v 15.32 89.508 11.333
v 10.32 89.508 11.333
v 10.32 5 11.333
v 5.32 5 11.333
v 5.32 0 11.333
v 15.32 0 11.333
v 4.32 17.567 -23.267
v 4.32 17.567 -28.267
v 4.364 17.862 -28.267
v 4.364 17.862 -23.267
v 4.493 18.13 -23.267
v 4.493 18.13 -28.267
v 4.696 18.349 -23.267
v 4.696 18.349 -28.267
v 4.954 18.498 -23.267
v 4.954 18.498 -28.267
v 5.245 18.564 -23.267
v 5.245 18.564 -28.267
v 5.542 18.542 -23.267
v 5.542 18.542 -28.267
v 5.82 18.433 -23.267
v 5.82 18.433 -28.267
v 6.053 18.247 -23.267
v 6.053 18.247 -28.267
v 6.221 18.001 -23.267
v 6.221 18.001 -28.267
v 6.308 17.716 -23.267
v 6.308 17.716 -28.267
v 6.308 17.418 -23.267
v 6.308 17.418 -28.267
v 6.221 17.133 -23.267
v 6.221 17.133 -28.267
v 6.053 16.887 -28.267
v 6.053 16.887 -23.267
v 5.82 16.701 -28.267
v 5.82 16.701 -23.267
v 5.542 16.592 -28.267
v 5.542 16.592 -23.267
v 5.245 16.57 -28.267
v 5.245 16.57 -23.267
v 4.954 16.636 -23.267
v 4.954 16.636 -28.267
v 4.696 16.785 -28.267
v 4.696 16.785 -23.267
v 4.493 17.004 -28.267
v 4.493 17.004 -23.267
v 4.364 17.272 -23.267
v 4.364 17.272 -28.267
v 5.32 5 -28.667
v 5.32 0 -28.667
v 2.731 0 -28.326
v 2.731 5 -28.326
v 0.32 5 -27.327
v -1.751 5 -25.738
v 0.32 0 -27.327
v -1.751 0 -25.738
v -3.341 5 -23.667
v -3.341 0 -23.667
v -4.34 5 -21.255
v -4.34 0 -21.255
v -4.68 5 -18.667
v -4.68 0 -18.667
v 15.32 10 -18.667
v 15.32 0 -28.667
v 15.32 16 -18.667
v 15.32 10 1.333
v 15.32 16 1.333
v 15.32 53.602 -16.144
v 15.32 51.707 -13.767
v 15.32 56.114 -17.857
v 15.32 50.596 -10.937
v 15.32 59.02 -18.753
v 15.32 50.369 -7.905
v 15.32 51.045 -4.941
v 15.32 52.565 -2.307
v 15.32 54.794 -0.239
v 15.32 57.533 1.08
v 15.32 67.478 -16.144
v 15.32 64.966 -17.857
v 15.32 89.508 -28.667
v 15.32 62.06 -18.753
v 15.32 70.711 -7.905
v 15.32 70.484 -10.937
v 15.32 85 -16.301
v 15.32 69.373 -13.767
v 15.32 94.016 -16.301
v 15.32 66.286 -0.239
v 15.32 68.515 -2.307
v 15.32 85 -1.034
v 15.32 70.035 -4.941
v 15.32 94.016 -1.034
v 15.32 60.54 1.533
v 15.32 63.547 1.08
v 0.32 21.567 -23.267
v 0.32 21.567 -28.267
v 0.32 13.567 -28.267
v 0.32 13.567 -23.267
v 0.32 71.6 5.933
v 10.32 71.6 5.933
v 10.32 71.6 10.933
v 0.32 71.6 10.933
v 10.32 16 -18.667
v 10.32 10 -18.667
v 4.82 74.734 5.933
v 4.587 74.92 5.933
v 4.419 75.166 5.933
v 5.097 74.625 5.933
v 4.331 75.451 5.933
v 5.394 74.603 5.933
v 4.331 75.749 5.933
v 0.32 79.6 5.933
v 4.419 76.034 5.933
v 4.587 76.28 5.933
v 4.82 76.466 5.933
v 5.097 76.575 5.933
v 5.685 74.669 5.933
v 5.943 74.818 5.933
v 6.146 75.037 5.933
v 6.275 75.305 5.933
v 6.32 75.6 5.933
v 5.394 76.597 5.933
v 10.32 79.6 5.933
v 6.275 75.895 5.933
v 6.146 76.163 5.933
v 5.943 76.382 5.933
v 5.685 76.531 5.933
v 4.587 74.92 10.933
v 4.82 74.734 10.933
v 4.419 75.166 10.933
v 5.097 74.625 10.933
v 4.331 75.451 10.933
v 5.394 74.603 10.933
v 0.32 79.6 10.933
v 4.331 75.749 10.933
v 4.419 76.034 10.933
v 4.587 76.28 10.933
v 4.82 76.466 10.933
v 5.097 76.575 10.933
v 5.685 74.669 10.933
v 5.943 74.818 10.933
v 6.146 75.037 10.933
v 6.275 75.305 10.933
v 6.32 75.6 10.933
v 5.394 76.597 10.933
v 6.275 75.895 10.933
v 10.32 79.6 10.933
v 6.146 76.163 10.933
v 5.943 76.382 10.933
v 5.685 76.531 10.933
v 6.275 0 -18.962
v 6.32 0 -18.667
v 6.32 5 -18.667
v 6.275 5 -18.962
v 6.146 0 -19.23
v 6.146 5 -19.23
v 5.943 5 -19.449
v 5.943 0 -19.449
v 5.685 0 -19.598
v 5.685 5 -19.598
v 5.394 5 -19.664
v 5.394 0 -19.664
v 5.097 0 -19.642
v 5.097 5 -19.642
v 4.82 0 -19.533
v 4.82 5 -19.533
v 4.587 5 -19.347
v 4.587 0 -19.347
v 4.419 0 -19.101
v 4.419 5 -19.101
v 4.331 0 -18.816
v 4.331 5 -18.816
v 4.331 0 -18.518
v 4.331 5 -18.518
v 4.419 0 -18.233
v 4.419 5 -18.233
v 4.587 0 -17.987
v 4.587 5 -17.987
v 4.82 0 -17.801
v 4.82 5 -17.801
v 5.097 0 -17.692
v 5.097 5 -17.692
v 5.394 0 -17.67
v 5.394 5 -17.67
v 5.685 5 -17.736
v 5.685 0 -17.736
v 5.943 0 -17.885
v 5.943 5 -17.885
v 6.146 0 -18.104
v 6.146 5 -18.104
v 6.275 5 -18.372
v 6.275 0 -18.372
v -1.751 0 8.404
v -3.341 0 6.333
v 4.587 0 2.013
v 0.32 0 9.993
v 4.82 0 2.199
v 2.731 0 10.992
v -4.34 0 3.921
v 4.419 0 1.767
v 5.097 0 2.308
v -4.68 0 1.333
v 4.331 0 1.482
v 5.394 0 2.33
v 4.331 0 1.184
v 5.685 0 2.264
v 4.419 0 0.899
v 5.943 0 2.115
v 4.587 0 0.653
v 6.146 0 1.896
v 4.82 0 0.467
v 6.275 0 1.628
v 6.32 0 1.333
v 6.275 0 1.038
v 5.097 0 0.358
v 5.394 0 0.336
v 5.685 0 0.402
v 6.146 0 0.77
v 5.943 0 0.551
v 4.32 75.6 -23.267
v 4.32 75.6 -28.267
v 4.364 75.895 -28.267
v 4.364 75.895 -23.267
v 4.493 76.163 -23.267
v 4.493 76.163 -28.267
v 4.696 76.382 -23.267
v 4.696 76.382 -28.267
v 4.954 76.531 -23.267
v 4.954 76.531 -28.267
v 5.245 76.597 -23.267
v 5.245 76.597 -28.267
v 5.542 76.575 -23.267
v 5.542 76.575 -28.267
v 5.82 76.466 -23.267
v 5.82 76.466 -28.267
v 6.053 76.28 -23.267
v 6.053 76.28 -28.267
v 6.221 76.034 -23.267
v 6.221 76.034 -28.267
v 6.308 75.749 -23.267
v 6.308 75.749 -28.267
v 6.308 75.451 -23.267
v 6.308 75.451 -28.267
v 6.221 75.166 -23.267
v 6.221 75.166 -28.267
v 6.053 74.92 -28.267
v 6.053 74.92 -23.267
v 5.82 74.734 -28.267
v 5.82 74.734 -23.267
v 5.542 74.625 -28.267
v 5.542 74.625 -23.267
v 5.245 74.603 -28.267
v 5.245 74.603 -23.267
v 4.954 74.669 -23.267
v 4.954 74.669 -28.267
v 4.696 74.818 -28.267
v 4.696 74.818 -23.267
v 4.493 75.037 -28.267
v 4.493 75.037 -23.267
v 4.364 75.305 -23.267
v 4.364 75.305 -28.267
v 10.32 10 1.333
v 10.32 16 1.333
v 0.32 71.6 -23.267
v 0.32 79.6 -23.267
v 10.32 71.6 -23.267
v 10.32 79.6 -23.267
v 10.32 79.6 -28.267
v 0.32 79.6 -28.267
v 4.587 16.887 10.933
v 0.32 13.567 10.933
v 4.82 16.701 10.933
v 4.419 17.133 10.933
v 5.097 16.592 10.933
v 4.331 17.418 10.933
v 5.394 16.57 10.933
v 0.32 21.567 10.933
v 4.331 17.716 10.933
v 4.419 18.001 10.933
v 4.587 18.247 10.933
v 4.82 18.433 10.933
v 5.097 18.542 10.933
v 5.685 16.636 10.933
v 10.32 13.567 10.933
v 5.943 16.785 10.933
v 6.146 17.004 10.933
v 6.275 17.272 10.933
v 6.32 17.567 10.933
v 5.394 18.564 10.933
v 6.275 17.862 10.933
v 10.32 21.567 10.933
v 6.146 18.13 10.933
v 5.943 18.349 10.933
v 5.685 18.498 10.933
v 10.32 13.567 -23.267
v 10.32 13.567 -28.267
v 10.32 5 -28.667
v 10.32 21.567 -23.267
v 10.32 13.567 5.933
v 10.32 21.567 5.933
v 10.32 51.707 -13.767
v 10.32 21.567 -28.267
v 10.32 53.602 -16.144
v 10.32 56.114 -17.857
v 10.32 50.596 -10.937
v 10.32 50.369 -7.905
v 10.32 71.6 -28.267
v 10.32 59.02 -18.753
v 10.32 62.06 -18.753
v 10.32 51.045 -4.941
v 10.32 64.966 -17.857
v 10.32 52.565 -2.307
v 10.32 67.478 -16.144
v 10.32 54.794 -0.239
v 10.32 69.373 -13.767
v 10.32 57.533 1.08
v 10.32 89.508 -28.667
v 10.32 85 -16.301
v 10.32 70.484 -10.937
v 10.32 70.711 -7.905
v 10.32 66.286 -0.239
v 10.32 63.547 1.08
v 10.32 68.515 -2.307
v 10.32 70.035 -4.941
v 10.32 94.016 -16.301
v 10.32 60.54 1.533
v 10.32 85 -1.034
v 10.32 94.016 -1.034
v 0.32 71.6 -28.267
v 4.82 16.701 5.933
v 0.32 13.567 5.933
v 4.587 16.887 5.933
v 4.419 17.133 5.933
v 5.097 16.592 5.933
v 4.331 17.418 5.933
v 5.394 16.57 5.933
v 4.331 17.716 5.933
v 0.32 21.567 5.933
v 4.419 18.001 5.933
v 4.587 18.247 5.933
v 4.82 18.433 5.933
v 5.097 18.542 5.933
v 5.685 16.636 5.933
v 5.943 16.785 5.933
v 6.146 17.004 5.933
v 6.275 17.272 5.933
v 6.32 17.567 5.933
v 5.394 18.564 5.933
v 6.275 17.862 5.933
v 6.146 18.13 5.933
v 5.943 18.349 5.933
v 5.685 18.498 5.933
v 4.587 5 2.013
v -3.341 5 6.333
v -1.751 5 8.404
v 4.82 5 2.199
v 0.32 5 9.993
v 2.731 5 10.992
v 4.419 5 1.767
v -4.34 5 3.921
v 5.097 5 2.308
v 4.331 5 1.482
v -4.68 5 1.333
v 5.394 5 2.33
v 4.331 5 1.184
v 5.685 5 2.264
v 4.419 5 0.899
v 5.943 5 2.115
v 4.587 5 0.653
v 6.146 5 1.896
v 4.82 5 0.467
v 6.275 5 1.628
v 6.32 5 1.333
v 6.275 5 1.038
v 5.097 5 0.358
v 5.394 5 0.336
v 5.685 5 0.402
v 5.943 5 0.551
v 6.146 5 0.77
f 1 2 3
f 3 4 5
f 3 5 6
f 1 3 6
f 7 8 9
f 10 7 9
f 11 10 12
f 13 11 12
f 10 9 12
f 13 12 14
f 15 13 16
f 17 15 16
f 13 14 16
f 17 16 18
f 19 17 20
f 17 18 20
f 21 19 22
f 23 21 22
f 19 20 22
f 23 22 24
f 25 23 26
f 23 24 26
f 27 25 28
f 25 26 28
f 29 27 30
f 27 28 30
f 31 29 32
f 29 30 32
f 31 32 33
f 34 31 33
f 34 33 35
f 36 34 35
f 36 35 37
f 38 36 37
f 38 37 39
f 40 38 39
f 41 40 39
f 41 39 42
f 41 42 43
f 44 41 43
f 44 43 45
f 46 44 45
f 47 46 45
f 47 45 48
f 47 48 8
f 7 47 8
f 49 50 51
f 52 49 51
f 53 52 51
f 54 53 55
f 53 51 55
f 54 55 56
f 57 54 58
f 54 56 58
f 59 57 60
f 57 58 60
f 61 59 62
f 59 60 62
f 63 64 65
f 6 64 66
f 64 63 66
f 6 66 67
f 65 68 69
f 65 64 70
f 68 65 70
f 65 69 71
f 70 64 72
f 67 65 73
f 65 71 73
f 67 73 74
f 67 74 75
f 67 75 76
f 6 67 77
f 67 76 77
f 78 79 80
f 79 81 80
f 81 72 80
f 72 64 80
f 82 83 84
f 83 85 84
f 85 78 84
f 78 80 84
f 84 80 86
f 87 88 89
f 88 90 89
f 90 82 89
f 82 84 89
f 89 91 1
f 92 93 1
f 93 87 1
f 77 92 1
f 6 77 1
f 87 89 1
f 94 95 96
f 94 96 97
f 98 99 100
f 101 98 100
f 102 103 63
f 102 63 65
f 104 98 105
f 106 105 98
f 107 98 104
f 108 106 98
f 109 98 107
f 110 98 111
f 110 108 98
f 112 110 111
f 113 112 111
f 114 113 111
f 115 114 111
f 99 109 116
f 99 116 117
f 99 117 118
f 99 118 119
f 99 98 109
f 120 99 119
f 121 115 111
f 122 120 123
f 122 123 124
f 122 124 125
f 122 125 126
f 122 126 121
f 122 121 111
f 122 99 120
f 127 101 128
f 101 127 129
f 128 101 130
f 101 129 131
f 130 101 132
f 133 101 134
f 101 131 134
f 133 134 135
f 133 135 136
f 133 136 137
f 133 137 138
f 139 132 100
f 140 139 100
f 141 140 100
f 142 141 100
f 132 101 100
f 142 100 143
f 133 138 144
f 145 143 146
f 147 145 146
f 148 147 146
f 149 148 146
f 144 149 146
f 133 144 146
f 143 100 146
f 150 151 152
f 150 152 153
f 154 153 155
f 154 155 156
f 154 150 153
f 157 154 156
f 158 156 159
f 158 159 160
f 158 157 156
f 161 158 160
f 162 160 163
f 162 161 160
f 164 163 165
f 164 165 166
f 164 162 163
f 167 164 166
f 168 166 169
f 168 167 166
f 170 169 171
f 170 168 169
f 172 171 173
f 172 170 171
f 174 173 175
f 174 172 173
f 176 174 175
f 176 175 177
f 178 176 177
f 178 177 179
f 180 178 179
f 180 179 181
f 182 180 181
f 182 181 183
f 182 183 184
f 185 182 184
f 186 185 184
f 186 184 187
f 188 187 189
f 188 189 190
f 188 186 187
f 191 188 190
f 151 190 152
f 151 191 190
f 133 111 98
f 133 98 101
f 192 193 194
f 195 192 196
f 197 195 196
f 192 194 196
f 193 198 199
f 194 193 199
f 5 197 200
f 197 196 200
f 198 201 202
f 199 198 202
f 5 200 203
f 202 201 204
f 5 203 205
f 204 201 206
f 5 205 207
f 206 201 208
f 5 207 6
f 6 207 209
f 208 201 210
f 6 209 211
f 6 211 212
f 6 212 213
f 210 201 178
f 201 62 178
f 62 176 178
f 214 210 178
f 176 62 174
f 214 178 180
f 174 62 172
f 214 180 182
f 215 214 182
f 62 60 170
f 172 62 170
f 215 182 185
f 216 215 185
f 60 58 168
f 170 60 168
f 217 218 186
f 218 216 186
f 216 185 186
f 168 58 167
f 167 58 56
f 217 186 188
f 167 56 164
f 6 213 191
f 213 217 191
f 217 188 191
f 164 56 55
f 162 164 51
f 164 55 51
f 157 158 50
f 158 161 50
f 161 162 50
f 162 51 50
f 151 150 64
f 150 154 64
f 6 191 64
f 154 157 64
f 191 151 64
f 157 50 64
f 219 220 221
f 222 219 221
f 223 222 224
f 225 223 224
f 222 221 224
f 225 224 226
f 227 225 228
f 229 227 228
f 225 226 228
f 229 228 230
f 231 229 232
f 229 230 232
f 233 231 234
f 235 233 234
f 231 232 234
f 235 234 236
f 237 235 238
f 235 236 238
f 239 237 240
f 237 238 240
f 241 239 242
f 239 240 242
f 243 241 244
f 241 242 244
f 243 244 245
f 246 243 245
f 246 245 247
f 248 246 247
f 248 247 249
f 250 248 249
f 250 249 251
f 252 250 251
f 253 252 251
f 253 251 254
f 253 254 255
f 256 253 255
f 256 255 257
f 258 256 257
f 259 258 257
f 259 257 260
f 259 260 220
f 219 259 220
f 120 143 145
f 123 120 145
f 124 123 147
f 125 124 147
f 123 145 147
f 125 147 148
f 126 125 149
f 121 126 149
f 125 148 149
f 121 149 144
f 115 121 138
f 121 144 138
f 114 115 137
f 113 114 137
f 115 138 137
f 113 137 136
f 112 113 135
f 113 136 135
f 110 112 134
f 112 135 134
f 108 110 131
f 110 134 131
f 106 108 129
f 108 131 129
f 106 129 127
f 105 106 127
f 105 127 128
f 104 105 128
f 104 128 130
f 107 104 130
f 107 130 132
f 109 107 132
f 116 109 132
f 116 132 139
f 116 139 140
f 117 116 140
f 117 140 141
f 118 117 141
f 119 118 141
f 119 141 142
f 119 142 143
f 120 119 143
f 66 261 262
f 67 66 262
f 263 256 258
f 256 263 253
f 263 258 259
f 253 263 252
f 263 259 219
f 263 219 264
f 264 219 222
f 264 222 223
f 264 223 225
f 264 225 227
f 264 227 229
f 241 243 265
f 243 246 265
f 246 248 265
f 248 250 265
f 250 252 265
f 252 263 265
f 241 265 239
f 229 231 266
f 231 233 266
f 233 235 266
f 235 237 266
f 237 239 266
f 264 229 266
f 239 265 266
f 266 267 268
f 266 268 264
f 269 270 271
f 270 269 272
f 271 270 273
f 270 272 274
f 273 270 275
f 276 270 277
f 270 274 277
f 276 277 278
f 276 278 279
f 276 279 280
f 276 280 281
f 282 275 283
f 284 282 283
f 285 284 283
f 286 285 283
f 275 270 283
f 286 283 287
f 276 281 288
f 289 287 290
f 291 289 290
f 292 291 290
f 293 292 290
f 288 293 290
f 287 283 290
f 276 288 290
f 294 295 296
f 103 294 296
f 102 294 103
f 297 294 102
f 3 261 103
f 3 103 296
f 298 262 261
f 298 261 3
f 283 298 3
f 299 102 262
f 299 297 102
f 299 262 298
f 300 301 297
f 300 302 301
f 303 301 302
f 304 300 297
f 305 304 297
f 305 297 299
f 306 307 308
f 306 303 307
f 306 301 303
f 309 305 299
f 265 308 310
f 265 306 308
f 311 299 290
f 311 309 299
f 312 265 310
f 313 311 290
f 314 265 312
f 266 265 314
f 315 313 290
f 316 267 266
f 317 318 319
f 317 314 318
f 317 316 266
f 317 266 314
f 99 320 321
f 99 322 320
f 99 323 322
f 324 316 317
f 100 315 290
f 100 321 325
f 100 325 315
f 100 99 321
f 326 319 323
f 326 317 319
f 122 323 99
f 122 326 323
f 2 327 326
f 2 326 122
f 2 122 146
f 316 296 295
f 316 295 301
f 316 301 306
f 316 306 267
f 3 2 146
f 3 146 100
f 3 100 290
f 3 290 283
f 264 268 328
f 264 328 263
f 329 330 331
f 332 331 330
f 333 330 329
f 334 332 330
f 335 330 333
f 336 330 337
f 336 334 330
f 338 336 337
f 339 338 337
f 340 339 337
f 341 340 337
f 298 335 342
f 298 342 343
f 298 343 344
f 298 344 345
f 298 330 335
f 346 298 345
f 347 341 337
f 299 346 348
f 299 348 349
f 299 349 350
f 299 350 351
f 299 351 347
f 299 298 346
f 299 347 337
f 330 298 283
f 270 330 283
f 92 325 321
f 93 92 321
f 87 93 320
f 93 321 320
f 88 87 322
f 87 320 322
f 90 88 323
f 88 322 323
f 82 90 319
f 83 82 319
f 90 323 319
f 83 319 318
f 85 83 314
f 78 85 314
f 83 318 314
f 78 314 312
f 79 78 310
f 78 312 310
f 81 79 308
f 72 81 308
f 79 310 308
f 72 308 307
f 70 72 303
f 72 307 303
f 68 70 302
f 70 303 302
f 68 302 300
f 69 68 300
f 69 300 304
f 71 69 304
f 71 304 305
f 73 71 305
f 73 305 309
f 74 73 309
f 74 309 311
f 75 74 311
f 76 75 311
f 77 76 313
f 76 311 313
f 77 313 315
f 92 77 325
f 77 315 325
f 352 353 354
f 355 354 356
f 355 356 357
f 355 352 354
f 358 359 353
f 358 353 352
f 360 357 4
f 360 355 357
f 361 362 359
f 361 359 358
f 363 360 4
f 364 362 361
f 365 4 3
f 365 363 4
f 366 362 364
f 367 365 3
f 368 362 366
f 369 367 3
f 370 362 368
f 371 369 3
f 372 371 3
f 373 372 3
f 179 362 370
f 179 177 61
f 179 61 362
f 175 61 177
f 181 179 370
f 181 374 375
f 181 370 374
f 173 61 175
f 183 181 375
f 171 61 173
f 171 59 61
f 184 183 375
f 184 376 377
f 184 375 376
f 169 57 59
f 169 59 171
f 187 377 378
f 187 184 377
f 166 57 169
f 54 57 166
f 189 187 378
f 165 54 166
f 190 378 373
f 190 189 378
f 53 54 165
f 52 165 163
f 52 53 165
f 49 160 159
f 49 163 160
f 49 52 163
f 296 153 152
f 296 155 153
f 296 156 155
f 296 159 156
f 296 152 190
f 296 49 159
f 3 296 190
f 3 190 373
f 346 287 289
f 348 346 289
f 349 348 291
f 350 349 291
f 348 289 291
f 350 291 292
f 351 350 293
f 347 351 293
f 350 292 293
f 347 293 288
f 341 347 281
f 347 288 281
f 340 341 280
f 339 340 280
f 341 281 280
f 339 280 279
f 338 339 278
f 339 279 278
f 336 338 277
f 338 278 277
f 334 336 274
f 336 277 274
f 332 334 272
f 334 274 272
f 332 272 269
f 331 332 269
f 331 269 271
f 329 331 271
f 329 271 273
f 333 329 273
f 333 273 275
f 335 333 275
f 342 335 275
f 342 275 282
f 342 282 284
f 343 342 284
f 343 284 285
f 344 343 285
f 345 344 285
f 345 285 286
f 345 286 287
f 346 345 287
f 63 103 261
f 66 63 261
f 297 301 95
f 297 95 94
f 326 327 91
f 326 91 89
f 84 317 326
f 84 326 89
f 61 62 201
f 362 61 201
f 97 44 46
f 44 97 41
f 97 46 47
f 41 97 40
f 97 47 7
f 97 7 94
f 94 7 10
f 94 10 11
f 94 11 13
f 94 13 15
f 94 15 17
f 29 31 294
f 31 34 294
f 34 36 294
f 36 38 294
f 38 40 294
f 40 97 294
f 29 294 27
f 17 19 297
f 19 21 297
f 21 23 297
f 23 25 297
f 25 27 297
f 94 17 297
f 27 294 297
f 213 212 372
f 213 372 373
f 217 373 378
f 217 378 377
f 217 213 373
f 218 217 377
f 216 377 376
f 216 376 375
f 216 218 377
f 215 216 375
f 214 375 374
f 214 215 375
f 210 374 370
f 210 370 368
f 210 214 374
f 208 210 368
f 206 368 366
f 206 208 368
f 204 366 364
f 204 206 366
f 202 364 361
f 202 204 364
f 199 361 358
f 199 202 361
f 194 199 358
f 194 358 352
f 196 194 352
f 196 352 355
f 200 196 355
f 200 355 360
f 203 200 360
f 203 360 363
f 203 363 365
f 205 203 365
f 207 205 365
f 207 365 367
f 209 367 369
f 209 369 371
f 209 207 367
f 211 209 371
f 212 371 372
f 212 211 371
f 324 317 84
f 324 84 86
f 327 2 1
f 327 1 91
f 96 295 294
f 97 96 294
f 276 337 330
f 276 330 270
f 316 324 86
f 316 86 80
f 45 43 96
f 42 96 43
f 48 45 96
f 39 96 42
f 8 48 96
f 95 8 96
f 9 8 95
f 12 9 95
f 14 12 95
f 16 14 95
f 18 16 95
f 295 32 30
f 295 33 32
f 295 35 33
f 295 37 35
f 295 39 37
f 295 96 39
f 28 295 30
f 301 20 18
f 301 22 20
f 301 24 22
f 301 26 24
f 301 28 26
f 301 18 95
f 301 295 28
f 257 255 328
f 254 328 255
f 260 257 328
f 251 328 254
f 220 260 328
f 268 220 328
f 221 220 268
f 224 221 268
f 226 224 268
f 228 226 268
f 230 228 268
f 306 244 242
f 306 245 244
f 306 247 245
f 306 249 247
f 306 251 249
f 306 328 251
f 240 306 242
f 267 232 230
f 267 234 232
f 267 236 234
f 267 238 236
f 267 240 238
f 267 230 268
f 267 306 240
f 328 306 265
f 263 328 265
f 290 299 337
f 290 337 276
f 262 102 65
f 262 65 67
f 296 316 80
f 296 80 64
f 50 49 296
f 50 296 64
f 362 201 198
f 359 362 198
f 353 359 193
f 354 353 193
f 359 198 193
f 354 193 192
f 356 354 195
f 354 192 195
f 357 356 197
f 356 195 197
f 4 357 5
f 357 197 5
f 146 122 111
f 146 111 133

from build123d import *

# Parameters (mm, degrees)
SKETCH1_R           = 1
BOSS_EXTRUDE1_DEPTH = 5
SKETCH2_W           = 5
SKETCH2_H           = 40
BOSS_EXTRUDE2_DEPTH = 80
SKETCH3_R           = 2.22
CUT_EXTRUDE3_DEPTH  = 80
BOSS_EXTRUDE5_DEPTH = 5
SKETCH9_W           = 20
SKETCH9_H           = 6
CUT_EXTRUDE7_DEPTH  = 10
SKETCH10_W          = 5
SKETCH10_H          = 8
BOSS_EXTRUDE6_DEPTH = 10
SKETCH11_R          = 1
CUT_EXTRUDE9_DEPTH  = 8
SKETCH12_R          = 1
CUT_EXTRUDE10_DEPTH = 8
SKETCH5_R           = 2.22
BOSS_EXTRUDE7_DEPTH = 5
SKETCH14_R          = 10.2
BOSS_EXTRUDE8_DEPTH = 5


with BuildPart() as part:
    # Sketch1 → Boss-Extrude1 (new body)
    with BuildSketch(Plane(origin=(0, 0, 0), x_dir=(1, 0, 0), z_dir=(0, 1, 0))):
        with BuildLine():
            Line((5.319641756, -11.332905968), (15.319641756, -11.332905968))
            Line((15.319641756, -11.332905968), (15.319641756, 28.667094032))
            Line((15.319641756, 28.667094032), (5.319641756, 28.667094032))
            ThreePointArc((5.319641756, 28.667094032), (-1.751426056, 25.738161844), (-4.680358244, 18.667094032))
            Line((-4.680358244, 18.667094032), (-4.680358244, -1.332905968))
            ThreePointArc((-4.680358244, -1.332905968), (-1.751426056, -8.40397378), (5.319641756, -11.332905968))
        make_face()
        with Locations((5.319641756, 18.667094032)):
            Circle(SKETCH1_R, mode=Mode.SUBTRACT)
        with Locations((5.319641756, -1.332905968)):
            Circle(SKETCH1_R, mode=Mode.SUBTRACT)
    extrude(amount=BOSS_EXTRUDE1_DEPTH)

    # Sketch2 → Boss-Extrude2 (add)
    with BuildSketch(Plane(origin=(0, 5, 0), x_dir=(1, 0, 0), z_dir=(0, 1, 0))):
        with Locations((12.819641756, 8.667094032)):
            Rectangle(SKETCH2_W, SKETCH2_H)
    extrude(amount=BOSS_EXTRUDE2_DEPTH)

    # Sketch3 → Cut-Extrude3 (cut)
    with BuildSketch(Plane.ZY.offset(-10.319641756)):
        with BuildLine():
            ThreePointArc((0.732905968, 35.401978793), (1.440012749, 35.694872012), (1.732905968, 36.401978793))
            Line((1.732905968, 36.401978793), (1.732905968, 69.94419701))
            ThreePointArc((1.732905968, 69.94419701), (1.440012749, 70.651303792), (0.732905968, 70.94419701))
            Line((0.732905968, 70.94419701), (-18.067094032, 70.94419701))
            ThreePointArc((-18.067094032, 70.94419701), (-18.774200813, 70.651303792), (-19.067094032, 69.94419701))
            Line((-19.067094032, 69.94419701), (-19.067094032, 36.401978793))
            ThreePointArc((-19.067094032, 36.401978793), (-18.774200813, 35.694872012), (-18.067094032, 35.401978793))
            Line((-18.067094032, 35.401978793), (0.732905968, 35.401978793))
        make_face()
        with Locations((-13.167094032, 75.54419701)):
            Circle(SKETCH3_R)
        with Locations((-13.167094032, 25.24419701)):
            Circle(SKETCH3_R)
        with Locations((-4.167094032, 25.24419701)):
            Circle(SKETCH3_R)
        with Locations((-4.167094032, 75.54419701)):
            Circle(SKETCH3_R)
    extrude(amount=-CUT_EXTRUDE3_DEPTH, mode=Mode.SUBTRACT)

    # Sketch8 → Boss-Extrude5 (add, through all)
    with BuildSketch(Plane.ZY.offset(-10.319641756)):
        Polygon((-28.667094032, 89.50779106), (-28.667094032, 85), (-16.300533883, 85), (-16.300533883, 94.015582119), align=None)
        Polygon((-1.033654181, 94.015582119), (-1.033654181, 85), (11.332905968, 85), (11.332905968, 89.50779106), align=None)
    extrude(amount=-BOSS_EXTRUDE5_DEPTH)

    # Sketch9 → Cut-Extrude7 (cut)
    with BuildSketch(Plane.ZY.offset(-10.319641756)):
        with Locations((-8.667094032, 13)):
            Rectangle(SKETCH9_W, SKETCH9_H)
    extrude(amount=-CUT_EXTRUDE7_DEPTH, mode=Mode.SUBTRACT)

    # Sketch10 → Boss-Extrude6 (add)
    with BuildSketch(Plane.ZY.offset(-10.319641756)):
        with Locations((-25.767094032, 17.566871705)):
            Rectangle(SKETCH10_W, SKETCH10_H)
        with Locations((8.432905968, 17.566871705)):
            Rectangle(SKETCH10_W, SKETCH10_H)
        with Locations((8.432905968, 75.6)):
            Rectangle(SKETCH10_W, SKETCH10_H)
        with Locations((-25.767094032, 75.6)):
            Rectangle(SKETCH10_W, SKETCH10_H)
    extrude(amount=BOSS_EXTRUDE6_DEPTH)

    # Sketch11 → Cut-Extrude9 (cut)
    with BuildSketch(Plane.XY.offset(10.932905968)):
        with Locations((5.319641756, 17.566871705)):
            Circle(SKETCH11_R)
        with Locations((5.319641756, 75.6)):
            Circle(SKETCH11_R)
    extrude(amount=-CUT_EXTRUDE9_DEPTH, mode=Mode.SUBTRACT)

    # Sketch12 → Cut-Extrude10 (cut)
    with BuildSketch(Plane(origin=(0, 0, -28.267094032), x_dir=(-1, 0, 0), z_dir=(0, 0, -1))):
        with Locations((-5.319641756, 75.6)):
            Circle(SKETCH12_R)
        with Locations((-5.319641756, 17.566871705)):
            Circle(SKETCH12_R)
    extrude(amount=-CUT_EXTRUDE10_DEPTH, mode=Mode.SUBTRACT)

    # Sketch5 → Boss-Extrude7 (add)
    with BuildSketch(Plane(origin=(15.319641756, 0, 0), x_dir=(0, 0, -1), z_dir=(1, 0, 0))):
        with Locations((4.167094032, 25.24419701)):
            Circle(SKETCH5_R)
        with Locations((13.167094032, 25.24419701)):
            Circle(SKETCH5_R)
        with Locations((4.167094032, 75.54419701)):
            Circle(SKETCH5_R)
        with Locations((13.167094032, 75.54419701)):
            Circle(SKETCH5_R)
    extrude(amount=-BOSS_EXTRUDE7_DEPTH)

    # Sketch14 → Boss-Extrude8 (add)
    with BuildSketch(Plane.ZY.offset(-10.319641756)):
        with BuildLine():
            Line((0.732905968, 70.94419701), (-18.067094032, 70.94419701))
            ThreePointArc((-18.067094032, 70.94419701), (-18.774200813, 70.651303792), (-19.067094032, 69.94419701))
            Line((-19.067094032, 69.94419701), (-19.067094032, 36.401978793))
            ThreePointArc((-19.067094032, 36.401978793), (-18.774200813, 35.694872012), (-18.067094032, 35.401978793))
            Line((-18.067094032, 35.401978793), (0.732905968, 35.401978793))
            ThreePointArc((0.732905968, 35.401978793), (1.440012749, 35.694872012), (1.732905968, 36.401978793))
            Line((1.732905968, 36.401978793), (1.732905968, 69.94419701))
            ThreePointArc((1.732905968, 69.94419701), (1.440012749, 70.651303792), (0.732905968, 70.94419701))
        make_face()
        with Locations((-8.667094032, 60.54)):
            Circle(SKETCH14_R, mode=Mode.SUBTRACT)
    extrude(amount=-BOSS_EXTRUDE8_DEPTH)


solid = part.part
